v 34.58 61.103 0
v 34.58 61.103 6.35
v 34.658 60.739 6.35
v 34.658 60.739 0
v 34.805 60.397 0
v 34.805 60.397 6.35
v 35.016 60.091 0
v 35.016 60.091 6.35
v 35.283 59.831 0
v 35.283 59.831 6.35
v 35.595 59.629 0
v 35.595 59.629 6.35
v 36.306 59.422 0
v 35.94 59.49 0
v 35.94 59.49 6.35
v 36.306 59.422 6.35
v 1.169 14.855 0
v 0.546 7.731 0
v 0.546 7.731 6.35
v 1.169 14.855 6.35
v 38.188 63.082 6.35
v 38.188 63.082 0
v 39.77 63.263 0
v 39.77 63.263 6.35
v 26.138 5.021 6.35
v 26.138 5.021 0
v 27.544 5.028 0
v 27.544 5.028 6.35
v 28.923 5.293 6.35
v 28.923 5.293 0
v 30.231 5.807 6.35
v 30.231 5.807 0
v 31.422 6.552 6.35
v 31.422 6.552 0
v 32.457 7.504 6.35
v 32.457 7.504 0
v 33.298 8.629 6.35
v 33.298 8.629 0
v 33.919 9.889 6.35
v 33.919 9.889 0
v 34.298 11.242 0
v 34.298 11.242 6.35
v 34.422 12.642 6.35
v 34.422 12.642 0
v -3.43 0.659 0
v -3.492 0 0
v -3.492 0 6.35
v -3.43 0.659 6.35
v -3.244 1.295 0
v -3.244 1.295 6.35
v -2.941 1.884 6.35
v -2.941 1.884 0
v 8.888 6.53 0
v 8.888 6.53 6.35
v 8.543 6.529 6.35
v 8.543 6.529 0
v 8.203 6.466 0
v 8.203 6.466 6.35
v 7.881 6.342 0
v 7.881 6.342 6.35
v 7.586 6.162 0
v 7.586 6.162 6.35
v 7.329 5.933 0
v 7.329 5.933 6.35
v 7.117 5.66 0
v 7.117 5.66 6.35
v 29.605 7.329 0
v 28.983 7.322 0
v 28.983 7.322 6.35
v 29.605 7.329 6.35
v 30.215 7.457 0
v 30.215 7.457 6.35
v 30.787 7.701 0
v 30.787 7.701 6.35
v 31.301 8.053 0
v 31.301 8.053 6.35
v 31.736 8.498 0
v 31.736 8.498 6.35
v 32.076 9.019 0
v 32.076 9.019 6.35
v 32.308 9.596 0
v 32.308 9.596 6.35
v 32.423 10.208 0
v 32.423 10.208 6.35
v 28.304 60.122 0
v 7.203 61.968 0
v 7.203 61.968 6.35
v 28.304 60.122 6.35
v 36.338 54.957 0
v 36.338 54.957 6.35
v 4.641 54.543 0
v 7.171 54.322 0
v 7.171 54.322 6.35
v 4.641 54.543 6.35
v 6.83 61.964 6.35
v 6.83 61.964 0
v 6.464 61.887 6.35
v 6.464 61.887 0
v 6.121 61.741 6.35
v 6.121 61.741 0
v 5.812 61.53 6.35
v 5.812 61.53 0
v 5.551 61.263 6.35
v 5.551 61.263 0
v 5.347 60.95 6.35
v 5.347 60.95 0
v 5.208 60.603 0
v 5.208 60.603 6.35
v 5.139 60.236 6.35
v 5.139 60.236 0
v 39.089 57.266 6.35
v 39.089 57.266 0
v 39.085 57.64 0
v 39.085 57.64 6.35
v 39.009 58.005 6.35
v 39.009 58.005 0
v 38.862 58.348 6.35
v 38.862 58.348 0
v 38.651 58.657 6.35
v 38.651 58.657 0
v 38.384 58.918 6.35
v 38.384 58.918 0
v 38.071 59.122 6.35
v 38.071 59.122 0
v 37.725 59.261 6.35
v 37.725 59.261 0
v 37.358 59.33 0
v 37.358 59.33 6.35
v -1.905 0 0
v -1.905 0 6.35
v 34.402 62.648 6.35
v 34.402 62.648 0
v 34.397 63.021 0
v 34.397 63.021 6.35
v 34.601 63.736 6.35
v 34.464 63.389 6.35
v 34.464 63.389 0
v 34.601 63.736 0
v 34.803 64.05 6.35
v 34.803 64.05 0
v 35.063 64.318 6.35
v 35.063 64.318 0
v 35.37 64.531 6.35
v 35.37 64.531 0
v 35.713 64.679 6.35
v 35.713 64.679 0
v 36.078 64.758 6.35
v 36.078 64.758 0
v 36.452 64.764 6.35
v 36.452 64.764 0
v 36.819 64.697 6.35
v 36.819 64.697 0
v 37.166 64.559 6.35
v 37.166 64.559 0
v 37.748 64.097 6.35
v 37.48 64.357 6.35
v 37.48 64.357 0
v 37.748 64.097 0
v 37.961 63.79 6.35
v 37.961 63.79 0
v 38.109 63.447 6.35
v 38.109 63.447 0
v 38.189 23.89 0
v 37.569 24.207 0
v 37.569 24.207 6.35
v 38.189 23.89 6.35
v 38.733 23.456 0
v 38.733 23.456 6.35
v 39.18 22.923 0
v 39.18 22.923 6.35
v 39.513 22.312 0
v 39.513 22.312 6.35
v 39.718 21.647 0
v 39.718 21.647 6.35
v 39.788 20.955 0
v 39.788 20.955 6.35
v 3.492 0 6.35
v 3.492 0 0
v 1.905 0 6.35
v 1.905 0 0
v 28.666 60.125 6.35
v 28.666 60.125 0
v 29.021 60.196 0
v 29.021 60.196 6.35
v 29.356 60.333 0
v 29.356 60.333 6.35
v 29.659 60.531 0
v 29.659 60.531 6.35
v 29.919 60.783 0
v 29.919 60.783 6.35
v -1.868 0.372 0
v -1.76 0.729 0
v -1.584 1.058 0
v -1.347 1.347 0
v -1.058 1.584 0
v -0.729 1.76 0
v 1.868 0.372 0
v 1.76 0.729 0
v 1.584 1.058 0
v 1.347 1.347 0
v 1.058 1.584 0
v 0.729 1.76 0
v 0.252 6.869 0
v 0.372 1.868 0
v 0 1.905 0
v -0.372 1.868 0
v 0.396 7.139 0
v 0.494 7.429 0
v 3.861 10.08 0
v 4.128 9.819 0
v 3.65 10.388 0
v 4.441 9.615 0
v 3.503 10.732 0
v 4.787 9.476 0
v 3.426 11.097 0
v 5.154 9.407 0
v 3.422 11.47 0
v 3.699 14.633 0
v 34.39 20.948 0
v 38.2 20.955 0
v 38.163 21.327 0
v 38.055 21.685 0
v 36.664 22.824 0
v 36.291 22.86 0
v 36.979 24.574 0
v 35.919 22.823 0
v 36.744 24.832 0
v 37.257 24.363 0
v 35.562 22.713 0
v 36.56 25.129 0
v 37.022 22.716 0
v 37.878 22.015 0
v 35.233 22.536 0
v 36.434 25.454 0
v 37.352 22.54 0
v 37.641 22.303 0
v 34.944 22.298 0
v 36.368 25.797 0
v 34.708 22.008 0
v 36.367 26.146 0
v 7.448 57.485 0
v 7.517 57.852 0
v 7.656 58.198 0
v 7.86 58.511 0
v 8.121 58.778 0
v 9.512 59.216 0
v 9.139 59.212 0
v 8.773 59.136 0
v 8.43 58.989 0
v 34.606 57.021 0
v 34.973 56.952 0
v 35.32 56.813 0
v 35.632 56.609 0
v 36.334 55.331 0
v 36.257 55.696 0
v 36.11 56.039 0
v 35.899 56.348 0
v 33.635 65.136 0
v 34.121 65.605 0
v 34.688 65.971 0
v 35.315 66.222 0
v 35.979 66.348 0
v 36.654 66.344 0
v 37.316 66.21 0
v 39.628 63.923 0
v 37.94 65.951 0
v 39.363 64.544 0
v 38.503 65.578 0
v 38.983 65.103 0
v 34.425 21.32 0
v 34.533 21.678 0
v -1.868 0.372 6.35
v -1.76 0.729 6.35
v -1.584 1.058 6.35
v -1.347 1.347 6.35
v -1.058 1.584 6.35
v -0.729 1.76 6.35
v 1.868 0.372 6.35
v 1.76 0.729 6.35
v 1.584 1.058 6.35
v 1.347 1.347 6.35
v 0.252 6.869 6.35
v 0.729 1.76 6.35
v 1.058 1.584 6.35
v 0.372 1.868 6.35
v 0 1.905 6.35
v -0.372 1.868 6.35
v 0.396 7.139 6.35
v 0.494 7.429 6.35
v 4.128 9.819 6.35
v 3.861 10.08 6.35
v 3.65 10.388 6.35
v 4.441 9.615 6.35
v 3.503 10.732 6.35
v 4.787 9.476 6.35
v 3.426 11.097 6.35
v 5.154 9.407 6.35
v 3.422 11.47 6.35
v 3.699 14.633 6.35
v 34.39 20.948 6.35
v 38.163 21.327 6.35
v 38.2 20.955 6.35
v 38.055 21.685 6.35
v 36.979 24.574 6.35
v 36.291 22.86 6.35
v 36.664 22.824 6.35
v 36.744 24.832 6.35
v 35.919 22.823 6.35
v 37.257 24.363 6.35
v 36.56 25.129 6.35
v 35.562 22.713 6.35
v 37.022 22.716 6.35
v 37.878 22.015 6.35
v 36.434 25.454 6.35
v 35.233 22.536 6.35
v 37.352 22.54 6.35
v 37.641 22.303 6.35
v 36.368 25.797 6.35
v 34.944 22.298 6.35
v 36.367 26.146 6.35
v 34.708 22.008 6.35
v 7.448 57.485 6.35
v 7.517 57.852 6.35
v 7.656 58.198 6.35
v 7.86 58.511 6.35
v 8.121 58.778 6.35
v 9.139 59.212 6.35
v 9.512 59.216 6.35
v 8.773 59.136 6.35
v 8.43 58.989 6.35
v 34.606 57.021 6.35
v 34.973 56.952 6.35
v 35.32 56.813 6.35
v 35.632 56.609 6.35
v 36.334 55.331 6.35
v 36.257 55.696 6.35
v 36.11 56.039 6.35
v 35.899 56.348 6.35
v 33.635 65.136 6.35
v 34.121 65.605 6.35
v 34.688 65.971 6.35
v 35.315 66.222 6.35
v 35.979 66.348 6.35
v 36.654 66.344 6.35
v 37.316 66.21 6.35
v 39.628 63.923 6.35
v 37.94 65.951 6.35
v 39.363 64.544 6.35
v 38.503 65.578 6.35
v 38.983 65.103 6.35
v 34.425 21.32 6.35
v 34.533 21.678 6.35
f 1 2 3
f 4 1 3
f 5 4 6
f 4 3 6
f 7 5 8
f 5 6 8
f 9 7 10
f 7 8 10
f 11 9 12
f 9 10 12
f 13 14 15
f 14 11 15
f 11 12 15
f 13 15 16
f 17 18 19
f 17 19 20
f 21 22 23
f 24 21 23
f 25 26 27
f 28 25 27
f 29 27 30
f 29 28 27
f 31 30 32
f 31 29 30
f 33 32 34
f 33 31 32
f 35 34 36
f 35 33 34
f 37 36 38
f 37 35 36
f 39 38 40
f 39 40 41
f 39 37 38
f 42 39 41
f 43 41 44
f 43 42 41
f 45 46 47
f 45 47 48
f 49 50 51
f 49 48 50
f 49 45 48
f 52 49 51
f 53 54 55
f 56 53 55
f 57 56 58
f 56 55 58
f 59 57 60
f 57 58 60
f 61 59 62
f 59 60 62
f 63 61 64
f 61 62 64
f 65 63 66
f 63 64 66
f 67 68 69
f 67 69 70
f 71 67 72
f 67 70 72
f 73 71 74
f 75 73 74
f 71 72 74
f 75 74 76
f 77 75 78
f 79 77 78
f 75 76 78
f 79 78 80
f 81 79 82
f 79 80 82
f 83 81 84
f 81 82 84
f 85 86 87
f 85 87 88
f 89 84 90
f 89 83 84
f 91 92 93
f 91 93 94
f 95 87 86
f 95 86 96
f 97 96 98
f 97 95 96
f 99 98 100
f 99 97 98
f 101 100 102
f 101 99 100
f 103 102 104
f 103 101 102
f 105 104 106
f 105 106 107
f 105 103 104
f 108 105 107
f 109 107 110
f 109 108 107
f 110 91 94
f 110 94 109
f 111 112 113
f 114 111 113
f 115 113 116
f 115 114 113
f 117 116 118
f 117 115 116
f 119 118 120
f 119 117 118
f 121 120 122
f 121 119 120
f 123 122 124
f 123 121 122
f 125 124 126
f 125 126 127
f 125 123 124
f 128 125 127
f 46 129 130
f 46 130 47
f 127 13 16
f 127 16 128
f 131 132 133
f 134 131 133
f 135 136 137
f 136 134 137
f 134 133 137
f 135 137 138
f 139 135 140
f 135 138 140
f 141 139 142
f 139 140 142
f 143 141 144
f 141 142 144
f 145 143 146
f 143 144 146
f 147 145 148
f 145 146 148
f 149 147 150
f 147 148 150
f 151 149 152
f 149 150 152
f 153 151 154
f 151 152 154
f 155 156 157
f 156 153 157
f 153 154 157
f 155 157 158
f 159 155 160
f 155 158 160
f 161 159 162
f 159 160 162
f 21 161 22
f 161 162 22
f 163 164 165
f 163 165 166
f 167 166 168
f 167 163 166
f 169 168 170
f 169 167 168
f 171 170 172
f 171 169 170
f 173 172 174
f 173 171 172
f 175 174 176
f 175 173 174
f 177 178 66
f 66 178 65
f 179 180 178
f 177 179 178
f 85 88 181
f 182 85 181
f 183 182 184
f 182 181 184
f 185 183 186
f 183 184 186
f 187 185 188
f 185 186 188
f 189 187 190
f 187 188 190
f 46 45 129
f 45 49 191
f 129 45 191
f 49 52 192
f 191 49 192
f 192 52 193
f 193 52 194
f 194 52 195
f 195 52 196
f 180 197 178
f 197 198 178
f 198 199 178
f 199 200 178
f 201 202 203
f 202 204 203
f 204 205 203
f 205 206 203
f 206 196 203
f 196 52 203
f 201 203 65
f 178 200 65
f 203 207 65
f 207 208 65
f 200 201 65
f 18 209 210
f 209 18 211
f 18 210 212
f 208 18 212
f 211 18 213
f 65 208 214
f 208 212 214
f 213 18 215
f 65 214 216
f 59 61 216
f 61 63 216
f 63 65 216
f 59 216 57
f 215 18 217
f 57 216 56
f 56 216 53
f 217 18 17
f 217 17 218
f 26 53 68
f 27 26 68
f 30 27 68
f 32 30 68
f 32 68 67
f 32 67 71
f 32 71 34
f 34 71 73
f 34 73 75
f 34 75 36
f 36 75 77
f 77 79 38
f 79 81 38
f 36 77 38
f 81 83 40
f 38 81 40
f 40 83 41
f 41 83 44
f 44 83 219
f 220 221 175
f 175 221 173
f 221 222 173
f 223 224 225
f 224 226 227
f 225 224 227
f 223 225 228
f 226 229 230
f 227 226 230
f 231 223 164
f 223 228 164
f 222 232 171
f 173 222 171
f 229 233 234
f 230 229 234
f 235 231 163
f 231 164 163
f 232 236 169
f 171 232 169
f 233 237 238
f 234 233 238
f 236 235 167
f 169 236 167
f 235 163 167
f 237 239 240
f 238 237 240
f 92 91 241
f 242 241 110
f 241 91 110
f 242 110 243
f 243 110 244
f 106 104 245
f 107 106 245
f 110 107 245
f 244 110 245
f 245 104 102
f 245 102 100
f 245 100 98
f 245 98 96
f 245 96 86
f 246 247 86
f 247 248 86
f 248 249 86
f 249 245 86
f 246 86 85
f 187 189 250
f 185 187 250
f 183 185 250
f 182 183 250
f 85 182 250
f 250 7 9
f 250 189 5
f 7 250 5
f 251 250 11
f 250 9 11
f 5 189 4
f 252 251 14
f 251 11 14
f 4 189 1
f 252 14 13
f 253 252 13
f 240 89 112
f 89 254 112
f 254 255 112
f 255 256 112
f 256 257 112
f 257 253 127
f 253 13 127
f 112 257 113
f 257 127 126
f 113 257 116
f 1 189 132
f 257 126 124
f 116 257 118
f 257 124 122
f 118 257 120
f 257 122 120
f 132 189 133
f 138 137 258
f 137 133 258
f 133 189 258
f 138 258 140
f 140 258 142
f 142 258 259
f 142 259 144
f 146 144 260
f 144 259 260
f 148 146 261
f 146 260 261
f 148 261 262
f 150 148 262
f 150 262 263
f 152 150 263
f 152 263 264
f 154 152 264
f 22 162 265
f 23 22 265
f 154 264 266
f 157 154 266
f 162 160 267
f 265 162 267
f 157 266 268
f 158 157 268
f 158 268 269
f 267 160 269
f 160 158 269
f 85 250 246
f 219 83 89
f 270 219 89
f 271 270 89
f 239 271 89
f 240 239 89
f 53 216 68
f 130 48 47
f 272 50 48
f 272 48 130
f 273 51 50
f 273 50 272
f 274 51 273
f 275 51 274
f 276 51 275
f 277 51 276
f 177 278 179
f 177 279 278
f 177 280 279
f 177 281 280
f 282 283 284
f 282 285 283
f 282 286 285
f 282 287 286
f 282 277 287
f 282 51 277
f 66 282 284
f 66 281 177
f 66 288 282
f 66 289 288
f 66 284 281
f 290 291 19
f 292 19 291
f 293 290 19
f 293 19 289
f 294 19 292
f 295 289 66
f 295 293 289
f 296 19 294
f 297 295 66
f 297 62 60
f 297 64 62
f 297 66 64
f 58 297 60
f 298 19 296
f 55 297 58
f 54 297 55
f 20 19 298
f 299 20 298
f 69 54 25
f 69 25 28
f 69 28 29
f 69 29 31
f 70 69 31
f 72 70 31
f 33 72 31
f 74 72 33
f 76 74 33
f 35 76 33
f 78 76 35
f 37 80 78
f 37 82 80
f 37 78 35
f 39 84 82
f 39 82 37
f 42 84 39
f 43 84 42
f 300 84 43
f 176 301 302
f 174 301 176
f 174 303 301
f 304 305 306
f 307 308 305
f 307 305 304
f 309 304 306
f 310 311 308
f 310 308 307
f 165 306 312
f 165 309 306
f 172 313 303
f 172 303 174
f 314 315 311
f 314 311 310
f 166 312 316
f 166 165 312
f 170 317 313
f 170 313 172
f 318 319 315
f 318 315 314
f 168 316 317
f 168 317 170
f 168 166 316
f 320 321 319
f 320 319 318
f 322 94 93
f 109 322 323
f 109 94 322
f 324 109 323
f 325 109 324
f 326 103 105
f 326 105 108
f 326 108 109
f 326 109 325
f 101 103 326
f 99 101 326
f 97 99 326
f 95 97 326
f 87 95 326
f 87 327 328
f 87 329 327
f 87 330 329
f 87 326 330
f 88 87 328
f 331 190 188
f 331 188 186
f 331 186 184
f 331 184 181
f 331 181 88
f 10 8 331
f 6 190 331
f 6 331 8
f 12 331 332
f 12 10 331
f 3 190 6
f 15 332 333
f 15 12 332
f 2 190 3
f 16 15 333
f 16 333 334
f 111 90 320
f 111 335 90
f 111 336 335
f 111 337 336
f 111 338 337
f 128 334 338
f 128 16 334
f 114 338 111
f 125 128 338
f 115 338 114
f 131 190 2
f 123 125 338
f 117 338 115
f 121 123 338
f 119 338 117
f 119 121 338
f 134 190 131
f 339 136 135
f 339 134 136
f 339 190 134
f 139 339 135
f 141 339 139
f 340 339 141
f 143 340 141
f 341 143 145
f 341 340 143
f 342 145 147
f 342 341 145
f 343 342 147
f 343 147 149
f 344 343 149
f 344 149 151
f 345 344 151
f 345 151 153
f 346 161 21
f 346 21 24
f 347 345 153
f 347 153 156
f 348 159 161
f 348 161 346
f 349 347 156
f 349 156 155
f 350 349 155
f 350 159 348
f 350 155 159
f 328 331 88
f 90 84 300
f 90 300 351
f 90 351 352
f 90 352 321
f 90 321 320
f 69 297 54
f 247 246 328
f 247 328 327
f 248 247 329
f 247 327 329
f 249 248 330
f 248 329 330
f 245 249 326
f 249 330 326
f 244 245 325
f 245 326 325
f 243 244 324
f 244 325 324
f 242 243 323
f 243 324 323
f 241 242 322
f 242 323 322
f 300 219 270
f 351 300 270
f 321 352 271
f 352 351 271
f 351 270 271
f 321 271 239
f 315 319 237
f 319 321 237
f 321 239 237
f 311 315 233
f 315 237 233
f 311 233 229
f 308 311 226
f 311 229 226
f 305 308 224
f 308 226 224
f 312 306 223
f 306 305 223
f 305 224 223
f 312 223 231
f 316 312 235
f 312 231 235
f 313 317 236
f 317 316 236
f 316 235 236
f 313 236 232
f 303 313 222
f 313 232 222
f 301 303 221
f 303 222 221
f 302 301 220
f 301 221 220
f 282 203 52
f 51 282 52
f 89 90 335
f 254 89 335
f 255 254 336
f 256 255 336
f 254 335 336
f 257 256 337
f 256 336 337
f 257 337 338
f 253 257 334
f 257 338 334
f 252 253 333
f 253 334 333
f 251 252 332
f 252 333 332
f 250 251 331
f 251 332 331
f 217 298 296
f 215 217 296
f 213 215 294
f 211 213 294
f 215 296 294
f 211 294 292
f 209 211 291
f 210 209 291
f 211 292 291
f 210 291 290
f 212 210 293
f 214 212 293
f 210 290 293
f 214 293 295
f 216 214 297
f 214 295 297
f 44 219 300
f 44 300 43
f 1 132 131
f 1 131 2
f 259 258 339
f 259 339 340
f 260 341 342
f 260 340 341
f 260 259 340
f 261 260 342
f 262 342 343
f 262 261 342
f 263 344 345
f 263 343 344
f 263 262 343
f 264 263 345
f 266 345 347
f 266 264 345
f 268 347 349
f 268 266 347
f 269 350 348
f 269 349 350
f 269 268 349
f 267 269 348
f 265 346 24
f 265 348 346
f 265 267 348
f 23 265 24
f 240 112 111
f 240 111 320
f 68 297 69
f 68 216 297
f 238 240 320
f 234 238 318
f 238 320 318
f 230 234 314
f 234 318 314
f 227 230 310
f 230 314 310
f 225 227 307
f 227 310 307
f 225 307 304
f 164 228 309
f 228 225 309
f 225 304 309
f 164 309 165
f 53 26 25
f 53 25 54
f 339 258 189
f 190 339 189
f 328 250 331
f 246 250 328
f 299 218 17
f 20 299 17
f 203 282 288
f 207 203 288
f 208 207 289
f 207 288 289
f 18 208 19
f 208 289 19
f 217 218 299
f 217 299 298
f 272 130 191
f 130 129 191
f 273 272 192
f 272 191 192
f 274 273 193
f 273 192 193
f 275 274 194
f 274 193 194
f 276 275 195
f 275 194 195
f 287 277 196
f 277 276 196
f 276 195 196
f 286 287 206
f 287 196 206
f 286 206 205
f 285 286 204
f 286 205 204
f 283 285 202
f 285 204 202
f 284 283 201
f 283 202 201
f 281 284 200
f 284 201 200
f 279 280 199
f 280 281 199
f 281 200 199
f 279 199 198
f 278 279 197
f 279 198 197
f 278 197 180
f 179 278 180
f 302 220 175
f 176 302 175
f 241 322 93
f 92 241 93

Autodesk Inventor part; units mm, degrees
ref_plane "YZ Plane" through (0, 0, 0) normal (1, 0, 0) x (0, 1, 0)
ref_plane "XZ Plane" through (0, 0, 0) normal (0, 1, 0) x (-1, 0, 0)
ref_plane "XY Plane" through (0, 0, 0) normal (0, 0, 1) x (1, 0, 0)
sketch "Sketch1" plane through (0, 0, 0) normal (0, 0, 1) x (1, 0, 0)
  arc A0 (1.905, 0) -> (-1.905, 0) centre (0, 0) ccw
  arc A1 (38.2001, 20.955) -> (34.3901, 20.9476) centre (36.2951, 20.955) ccw
  arc A2 (38.1877, 63.0819) -> (34.4025, 62.6481) centre (36.2951, 62.865) ccw
  line L0 (36.2951, 62.865) -> (36.2951, 20.955) construction
  line L1 (36.2951, 20.955) -> (0, 0) construction
  line L2 (32.146, 7.0452) -> (36.5038, 56.8549)
  line L3 (36.5038, 56.8549) -> (7.6142, 59.3825)
  line L4 (3.2564, 9.5727) -> (32.146, 7.0452)
  line L5 (0, 0) -> (62.4148, 0) construction
  line L6 (39.2555, 59.1639) -> (36.2181, 24.4467)
  line L7 (34.455, 4.2935) -> (7.7392, 6.6308)
  line L8 (7.1714, 54.3218) -> (4.6411, 54.5432)
  line L9 (3.6991, 14.6334) -> (1.1688, 14.8548)
  line L10 (38.2001, 20.955) -> (39.7876, 20.955)
  line L11 (-1.905, 0) -> (-3.4925, 0)
  line L12 (1.905, 0) -> (3.4925, 0)
  line L13 (0.5047, 7.2638) -> (1.1688, 14.8548)
  line L14 (4.6411, 54.5432) -> (5.3052, 62.1342)
  line L15 (7.6142, 59.3825) -> (7.1714, 54.3218)
  line L16 (3.6991, 14.6334) -> (3.2564, 9.5727)
  line L17 (0.5047, 7.2638) -> (-2.941, 1.8836)
  line L18 (3.4925, 0) -> (7.7392, 6.6308)
  line L19 (34.3901, 20.9476) -> (34.455, 4.2935)
  arc A3 (39.7876, 20.955) -> (36.2181, 24.4467) centre (36.2951, 20.955) ccw
  line L20 (33.6354, 65.1357) -> (29.2821, 60.0365)
  line L21 (38.1877, 63.0819) -> (39.7696, 63.2631)
  line L22 (34.4025, 62.6481) -> (34.7567, 59.5575)
  arc A4 (39.7696, 63.2631) -> (33.6354, 65.1357) centre (36.2951, 62.865) ccw
  arc A5 (-2.941, 1.8836) -> (-3.4925, 0) centre (0, 0) ccw
  line L23 (5.3052, 62.1342) -> (29.2821, 60.0365)
  line L24 (34.7567, 59.5575) -> (39.2555, 59.1639)
  dimension "d0" = 3.81
  dimension "d1" = 41.91
  dimension "d2" = 120
  dimension "d4" = 29
  dimension "d5" = 50
  dimension "d6" = 5.969
  dimension "d7" = 2.921
  dimension "d8" = 85
  dimension "d10" = 5.08
  dimension "d11" = 5.08
  dimension "d13" = 2.54
extrude "Extrusion1" add sketch "Sketch1" along normal blind 6.35
fillet "Fillet2" radius 3.175 1 edges at (32.146, 7.0452, 3.175)
fillet "Fillet1" radius 7.62 1 edges at (34.455, 4.2935, 3.175)
fillet "Fillet3" radius 1.905 10 edges at (3.2564, 9.5727, 3.175) (7.6142, 59.3825, 3.175) (36.5038, 56.8549, 3.175) (34.7567, 59.5575, 3.175) (29.2821, 60.0365, 3.175) (39.2555, 59.1639, 3.175) (36.2181, 24.4467, 3.175) (7.7392, 6.6308, 3.175) (0.5047, 7.2638, 3.175) (5.3052, 62.1342, 3.175)
equation "\"d13\" = d9"
equation "\"d9\" = 2.54"
properties part number "DriveBatteryHolder" material "ABS Plastic"
